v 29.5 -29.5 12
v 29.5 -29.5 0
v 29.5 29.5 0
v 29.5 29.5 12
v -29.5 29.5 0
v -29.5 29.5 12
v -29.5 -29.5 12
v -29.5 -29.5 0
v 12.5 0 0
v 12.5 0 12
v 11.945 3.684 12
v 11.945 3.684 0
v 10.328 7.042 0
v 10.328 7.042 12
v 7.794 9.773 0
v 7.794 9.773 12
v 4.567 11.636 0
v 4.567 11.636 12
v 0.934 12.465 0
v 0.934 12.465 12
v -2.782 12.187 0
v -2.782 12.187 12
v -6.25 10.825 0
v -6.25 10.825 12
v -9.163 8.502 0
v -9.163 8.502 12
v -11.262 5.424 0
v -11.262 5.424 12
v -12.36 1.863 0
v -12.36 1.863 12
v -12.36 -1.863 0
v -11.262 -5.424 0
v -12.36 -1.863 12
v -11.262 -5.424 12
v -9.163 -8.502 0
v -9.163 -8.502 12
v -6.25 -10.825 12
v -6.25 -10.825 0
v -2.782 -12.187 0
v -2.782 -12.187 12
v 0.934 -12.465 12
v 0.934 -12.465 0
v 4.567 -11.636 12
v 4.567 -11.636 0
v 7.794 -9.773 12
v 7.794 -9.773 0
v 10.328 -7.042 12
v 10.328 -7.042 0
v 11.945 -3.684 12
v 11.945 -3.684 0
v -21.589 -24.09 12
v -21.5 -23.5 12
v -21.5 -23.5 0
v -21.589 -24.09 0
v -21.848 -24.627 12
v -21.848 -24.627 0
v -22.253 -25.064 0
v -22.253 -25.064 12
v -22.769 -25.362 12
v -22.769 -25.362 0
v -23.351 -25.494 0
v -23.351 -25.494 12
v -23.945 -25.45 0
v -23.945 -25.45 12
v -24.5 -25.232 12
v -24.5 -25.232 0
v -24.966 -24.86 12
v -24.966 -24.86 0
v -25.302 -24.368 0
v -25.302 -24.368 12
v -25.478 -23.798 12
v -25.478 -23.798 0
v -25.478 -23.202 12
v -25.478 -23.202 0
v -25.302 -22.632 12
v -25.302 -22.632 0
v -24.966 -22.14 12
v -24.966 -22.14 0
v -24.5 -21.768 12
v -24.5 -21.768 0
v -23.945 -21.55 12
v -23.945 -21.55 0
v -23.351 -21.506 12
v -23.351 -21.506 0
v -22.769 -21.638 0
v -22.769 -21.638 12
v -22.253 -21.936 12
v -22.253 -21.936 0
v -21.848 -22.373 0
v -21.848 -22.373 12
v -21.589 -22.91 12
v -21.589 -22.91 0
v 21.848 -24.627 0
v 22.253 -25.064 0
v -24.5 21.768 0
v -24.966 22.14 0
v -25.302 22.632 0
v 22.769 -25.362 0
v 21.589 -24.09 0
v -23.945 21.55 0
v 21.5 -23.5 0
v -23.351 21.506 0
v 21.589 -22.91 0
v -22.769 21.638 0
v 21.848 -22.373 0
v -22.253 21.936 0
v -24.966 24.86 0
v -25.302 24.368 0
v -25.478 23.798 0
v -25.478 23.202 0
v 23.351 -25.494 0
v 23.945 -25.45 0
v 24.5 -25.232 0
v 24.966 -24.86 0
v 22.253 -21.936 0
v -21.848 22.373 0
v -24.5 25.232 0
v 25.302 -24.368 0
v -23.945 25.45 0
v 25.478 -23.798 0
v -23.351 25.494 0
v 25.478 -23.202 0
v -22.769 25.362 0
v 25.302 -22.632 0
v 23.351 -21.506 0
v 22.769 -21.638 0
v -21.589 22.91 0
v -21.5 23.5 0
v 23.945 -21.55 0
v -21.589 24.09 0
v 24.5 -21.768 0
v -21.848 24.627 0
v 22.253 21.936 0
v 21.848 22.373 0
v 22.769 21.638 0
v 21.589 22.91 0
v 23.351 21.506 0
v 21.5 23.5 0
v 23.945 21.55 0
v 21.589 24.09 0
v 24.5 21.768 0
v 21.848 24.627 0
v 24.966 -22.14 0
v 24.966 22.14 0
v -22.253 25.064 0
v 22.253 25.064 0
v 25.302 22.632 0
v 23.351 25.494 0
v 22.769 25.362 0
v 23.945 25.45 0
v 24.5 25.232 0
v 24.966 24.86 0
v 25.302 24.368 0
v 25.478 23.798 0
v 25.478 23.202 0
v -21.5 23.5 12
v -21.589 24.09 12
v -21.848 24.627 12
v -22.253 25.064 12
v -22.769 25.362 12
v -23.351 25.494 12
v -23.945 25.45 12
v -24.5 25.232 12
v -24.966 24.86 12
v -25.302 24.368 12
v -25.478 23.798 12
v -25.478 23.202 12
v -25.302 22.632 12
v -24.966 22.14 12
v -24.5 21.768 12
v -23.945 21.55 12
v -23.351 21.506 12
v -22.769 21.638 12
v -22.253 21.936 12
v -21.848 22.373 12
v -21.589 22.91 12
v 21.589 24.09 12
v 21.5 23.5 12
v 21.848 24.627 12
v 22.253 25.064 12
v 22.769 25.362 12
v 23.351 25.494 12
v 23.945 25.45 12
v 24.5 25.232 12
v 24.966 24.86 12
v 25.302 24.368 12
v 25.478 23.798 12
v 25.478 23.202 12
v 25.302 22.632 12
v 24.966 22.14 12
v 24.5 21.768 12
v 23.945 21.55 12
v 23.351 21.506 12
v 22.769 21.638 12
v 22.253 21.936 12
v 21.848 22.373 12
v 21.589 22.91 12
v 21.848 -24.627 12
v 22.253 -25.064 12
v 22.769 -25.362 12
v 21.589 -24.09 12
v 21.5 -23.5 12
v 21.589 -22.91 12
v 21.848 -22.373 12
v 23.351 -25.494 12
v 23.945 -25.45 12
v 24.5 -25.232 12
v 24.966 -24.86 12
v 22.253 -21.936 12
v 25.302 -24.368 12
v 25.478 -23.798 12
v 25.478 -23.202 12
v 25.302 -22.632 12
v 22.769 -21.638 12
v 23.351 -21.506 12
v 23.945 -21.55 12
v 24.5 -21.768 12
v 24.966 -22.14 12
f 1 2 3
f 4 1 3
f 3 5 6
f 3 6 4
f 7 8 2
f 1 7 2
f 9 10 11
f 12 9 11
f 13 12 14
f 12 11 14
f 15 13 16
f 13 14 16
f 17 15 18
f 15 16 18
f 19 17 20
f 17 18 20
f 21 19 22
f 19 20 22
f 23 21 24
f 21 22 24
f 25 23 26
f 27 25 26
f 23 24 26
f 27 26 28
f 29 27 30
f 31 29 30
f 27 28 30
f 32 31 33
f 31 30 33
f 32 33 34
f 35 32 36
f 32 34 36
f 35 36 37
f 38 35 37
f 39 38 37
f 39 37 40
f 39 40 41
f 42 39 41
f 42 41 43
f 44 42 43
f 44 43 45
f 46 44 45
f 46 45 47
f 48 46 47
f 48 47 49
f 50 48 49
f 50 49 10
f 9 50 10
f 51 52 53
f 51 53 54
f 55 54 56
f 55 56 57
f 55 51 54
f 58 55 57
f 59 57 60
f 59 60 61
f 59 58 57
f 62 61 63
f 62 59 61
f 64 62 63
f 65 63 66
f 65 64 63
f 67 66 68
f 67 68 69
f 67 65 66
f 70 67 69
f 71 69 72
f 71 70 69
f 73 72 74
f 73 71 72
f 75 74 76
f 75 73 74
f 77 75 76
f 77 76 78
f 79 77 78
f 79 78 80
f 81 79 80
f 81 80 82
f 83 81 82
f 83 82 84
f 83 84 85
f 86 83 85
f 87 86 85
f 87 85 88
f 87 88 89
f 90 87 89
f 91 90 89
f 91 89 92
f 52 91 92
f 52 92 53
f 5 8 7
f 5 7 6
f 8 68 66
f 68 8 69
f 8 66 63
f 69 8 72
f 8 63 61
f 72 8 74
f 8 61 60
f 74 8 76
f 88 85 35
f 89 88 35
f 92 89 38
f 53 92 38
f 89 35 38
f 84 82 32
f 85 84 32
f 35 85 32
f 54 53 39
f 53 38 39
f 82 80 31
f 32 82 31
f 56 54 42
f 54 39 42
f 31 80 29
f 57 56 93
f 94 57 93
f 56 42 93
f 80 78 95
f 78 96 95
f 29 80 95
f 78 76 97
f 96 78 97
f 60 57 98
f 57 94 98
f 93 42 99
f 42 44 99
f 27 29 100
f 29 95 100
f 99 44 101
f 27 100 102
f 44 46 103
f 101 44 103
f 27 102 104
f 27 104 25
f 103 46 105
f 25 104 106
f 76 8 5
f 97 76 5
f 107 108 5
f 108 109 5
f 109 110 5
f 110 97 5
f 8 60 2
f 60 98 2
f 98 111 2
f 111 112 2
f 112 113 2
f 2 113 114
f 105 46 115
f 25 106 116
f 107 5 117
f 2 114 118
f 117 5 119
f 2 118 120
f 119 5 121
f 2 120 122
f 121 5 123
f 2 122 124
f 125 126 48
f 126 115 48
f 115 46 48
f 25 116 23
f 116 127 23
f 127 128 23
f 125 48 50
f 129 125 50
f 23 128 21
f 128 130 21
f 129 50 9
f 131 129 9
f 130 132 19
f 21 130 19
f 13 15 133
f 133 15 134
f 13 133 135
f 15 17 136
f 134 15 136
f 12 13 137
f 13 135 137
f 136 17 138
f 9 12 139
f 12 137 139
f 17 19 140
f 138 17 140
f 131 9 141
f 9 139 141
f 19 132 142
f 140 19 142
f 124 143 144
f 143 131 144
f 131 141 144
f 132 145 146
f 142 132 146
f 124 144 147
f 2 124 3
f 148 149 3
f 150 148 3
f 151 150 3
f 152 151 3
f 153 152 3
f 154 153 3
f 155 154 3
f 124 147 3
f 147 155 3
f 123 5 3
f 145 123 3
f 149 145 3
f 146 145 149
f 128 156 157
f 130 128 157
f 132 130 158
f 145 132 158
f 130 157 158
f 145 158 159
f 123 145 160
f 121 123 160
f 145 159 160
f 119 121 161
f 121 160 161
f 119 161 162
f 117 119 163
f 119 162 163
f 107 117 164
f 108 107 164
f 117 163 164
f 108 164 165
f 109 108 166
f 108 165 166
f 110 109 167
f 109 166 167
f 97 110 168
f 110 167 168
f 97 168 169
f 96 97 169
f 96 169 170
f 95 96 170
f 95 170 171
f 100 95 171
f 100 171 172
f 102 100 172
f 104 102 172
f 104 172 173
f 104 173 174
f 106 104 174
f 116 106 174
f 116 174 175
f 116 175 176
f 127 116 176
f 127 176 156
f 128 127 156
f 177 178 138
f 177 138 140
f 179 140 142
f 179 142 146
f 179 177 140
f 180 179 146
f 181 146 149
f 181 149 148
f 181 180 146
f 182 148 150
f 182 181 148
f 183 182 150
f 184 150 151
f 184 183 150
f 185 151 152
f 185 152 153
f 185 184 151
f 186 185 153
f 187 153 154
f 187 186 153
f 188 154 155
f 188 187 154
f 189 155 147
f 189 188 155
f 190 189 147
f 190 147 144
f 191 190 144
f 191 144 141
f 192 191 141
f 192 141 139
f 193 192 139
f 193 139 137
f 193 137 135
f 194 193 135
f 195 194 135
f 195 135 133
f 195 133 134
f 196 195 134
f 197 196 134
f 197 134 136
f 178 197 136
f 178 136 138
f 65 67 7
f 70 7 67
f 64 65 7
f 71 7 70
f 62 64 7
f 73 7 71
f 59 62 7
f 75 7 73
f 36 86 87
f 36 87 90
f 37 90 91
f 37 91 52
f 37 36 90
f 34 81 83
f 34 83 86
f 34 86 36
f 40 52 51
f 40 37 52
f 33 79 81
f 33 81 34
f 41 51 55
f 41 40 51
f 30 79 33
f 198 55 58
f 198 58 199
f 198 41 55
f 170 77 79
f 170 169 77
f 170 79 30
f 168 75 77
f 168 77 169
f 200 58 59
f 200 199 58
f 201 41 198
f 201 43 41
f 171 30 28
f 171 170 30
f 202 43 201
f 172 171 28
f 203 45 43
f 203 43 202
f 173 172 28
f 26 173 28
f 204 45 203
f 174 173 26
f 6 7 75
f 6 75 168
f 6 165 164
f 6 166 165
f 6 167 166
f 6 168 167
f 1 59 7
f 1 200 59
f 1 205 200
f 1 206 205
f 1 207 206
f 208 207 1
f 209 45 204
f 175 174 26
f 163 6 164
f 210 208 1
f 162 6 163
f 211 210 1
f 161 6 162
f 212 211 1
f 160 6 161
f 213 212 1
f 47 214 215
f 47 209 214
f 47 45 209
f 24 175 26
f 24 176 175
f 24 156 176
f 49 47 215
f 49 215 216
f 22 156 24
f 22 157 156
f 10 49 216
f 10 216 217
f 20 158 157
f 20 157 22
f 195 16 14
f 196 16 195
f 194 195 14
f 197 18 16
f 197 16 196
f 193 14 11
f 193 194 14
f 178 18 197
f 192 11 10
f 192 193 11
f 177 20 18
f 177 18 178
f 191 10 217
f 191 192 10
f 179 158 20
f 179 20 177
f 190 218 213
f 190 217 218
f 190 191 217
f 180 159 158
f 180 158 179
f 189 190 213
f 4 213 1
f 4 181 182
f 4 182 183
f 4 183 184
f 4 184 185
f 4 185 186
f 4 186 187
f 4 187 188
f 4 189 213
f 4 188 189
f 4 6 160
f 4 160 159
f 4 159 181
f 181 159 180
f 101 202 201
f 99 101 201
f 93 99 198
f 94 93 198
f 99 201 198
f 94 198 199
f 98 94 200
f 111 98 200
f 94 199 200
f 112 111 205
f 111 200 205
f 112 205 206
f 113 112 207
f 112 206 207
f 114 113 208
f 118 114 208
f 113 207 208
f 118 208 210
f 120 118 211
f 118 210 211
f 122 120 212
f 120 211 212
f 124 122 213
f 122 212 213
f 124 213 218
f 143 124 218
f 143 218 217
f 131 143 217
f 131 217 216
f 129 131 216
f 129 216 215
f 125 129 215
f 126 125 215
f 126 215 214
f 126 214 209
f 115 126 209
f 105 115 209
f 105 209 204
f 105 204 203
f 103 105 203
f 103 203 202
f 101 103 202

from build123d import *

# Parameters (mm, degrees)
SKETCH1_W               = 59
SKETCH1_H               = 59
BOSS_EXTRUDE1_DEPTH     = 12
CUT_EXTRUDE1_REACH      = 45.411
SKETCH2_R               = 2
MIRROR2_COPY_1_REACH    = 45.411
MIRROR2_COPY_1_SKETCH_R = 2
CUT_EXTRUDE2_REACH      = 45.411
SKETCH3_R               = 12.5


with BuildPart() as part:
    # Sketch1 → Boss-Extrude1 (new body)
    with BuildSketch(Plane.XY):
        Rectangle(SKETCH1_W, SKETCH1_H)
    extrude(amount=BOSS_EXTRUDE1_DEPTH)

    # Sketch2 → Cut-Extrude1 (cut, up to next)
    with BuildSketch(Plane.XY.offset(12), mode=Mode.PRIVATE) as cut_extrude1_sk1:
        with Locations((-23.5, 23.5)):
            Circle(SKETCH2_R)
    cut_extrude1_tool1 = extrude(cut_extrude1_sk1.sketch, amount=-CUT_EXTRUDE1_REACH, mode=Mode.PRIVATE) & part.part
    cut_extrude1 = cut_extrude1_tool1.solids().sort_by_distance((-23.5, 23.5, 12))[0]
    add(cut_extrude1, mode=Mode.SUBTRACT)

    # Mirror1: Cut-Extrude1 across plane
    add(cut_extrude1.mirror(Plane(origin=(0, 0, 0), x_dir=(0, 0, 1), z_dir=(1, 0, 0))), mode=Mode.SUBTRACT)

    # Mirror2: Cut-Extrude1 across plane
    add(cut_extrude1.mirror(Plane.ZX), mode=Mode.SUBTRACT)

    # Mirror2 copy 1 sketch → Mirror2 copy 1 (cut, up to next)
    with BuildSketch(Plane(origin=(0, 0, 12), x_dir=(-1, 0, 0), z_dir=(0, 0, 1)), mode=Mode.PRIVATE) as mirror2_copy_1_sk1:
        with Locations((-23.5, 23.5)):
            Circle(MIRROR2_COPY_1_SKETCH_R)
    mirror2_copy_1_tool1 = extrude(mirror2_copy_1_sk1.sketch, amount=-MIRROR2_COPY_1_REACH, mode=Mode.PRIVATE) & part.part
    add(mirror2_copy_1_tool1.solids().sort_by_distance((23.5, -23.5, 12))[0], mode=Mode.SUBTRACT)

    # Sketch3 → Cut-Extrude2 (cut, up to next)
    with BuildSketch(Plane.XY.offset(12), mode=Mode.PRIVATE) as cut_extrude2_sk1:
        Circle(SKETCH3_R)
    cut_extrude2_tool1 = extrude(cut_extrude2_sk1.sketch, amount=-CUT_EXTRUDE2_REACH, mode=Mode.PRIVATE) & part.part
    add(cut_extrude2_tool1.solids().sort_by_distance((0, 0, 12))[0], mode=Mode.SUBTRACT)


solid = part.part
